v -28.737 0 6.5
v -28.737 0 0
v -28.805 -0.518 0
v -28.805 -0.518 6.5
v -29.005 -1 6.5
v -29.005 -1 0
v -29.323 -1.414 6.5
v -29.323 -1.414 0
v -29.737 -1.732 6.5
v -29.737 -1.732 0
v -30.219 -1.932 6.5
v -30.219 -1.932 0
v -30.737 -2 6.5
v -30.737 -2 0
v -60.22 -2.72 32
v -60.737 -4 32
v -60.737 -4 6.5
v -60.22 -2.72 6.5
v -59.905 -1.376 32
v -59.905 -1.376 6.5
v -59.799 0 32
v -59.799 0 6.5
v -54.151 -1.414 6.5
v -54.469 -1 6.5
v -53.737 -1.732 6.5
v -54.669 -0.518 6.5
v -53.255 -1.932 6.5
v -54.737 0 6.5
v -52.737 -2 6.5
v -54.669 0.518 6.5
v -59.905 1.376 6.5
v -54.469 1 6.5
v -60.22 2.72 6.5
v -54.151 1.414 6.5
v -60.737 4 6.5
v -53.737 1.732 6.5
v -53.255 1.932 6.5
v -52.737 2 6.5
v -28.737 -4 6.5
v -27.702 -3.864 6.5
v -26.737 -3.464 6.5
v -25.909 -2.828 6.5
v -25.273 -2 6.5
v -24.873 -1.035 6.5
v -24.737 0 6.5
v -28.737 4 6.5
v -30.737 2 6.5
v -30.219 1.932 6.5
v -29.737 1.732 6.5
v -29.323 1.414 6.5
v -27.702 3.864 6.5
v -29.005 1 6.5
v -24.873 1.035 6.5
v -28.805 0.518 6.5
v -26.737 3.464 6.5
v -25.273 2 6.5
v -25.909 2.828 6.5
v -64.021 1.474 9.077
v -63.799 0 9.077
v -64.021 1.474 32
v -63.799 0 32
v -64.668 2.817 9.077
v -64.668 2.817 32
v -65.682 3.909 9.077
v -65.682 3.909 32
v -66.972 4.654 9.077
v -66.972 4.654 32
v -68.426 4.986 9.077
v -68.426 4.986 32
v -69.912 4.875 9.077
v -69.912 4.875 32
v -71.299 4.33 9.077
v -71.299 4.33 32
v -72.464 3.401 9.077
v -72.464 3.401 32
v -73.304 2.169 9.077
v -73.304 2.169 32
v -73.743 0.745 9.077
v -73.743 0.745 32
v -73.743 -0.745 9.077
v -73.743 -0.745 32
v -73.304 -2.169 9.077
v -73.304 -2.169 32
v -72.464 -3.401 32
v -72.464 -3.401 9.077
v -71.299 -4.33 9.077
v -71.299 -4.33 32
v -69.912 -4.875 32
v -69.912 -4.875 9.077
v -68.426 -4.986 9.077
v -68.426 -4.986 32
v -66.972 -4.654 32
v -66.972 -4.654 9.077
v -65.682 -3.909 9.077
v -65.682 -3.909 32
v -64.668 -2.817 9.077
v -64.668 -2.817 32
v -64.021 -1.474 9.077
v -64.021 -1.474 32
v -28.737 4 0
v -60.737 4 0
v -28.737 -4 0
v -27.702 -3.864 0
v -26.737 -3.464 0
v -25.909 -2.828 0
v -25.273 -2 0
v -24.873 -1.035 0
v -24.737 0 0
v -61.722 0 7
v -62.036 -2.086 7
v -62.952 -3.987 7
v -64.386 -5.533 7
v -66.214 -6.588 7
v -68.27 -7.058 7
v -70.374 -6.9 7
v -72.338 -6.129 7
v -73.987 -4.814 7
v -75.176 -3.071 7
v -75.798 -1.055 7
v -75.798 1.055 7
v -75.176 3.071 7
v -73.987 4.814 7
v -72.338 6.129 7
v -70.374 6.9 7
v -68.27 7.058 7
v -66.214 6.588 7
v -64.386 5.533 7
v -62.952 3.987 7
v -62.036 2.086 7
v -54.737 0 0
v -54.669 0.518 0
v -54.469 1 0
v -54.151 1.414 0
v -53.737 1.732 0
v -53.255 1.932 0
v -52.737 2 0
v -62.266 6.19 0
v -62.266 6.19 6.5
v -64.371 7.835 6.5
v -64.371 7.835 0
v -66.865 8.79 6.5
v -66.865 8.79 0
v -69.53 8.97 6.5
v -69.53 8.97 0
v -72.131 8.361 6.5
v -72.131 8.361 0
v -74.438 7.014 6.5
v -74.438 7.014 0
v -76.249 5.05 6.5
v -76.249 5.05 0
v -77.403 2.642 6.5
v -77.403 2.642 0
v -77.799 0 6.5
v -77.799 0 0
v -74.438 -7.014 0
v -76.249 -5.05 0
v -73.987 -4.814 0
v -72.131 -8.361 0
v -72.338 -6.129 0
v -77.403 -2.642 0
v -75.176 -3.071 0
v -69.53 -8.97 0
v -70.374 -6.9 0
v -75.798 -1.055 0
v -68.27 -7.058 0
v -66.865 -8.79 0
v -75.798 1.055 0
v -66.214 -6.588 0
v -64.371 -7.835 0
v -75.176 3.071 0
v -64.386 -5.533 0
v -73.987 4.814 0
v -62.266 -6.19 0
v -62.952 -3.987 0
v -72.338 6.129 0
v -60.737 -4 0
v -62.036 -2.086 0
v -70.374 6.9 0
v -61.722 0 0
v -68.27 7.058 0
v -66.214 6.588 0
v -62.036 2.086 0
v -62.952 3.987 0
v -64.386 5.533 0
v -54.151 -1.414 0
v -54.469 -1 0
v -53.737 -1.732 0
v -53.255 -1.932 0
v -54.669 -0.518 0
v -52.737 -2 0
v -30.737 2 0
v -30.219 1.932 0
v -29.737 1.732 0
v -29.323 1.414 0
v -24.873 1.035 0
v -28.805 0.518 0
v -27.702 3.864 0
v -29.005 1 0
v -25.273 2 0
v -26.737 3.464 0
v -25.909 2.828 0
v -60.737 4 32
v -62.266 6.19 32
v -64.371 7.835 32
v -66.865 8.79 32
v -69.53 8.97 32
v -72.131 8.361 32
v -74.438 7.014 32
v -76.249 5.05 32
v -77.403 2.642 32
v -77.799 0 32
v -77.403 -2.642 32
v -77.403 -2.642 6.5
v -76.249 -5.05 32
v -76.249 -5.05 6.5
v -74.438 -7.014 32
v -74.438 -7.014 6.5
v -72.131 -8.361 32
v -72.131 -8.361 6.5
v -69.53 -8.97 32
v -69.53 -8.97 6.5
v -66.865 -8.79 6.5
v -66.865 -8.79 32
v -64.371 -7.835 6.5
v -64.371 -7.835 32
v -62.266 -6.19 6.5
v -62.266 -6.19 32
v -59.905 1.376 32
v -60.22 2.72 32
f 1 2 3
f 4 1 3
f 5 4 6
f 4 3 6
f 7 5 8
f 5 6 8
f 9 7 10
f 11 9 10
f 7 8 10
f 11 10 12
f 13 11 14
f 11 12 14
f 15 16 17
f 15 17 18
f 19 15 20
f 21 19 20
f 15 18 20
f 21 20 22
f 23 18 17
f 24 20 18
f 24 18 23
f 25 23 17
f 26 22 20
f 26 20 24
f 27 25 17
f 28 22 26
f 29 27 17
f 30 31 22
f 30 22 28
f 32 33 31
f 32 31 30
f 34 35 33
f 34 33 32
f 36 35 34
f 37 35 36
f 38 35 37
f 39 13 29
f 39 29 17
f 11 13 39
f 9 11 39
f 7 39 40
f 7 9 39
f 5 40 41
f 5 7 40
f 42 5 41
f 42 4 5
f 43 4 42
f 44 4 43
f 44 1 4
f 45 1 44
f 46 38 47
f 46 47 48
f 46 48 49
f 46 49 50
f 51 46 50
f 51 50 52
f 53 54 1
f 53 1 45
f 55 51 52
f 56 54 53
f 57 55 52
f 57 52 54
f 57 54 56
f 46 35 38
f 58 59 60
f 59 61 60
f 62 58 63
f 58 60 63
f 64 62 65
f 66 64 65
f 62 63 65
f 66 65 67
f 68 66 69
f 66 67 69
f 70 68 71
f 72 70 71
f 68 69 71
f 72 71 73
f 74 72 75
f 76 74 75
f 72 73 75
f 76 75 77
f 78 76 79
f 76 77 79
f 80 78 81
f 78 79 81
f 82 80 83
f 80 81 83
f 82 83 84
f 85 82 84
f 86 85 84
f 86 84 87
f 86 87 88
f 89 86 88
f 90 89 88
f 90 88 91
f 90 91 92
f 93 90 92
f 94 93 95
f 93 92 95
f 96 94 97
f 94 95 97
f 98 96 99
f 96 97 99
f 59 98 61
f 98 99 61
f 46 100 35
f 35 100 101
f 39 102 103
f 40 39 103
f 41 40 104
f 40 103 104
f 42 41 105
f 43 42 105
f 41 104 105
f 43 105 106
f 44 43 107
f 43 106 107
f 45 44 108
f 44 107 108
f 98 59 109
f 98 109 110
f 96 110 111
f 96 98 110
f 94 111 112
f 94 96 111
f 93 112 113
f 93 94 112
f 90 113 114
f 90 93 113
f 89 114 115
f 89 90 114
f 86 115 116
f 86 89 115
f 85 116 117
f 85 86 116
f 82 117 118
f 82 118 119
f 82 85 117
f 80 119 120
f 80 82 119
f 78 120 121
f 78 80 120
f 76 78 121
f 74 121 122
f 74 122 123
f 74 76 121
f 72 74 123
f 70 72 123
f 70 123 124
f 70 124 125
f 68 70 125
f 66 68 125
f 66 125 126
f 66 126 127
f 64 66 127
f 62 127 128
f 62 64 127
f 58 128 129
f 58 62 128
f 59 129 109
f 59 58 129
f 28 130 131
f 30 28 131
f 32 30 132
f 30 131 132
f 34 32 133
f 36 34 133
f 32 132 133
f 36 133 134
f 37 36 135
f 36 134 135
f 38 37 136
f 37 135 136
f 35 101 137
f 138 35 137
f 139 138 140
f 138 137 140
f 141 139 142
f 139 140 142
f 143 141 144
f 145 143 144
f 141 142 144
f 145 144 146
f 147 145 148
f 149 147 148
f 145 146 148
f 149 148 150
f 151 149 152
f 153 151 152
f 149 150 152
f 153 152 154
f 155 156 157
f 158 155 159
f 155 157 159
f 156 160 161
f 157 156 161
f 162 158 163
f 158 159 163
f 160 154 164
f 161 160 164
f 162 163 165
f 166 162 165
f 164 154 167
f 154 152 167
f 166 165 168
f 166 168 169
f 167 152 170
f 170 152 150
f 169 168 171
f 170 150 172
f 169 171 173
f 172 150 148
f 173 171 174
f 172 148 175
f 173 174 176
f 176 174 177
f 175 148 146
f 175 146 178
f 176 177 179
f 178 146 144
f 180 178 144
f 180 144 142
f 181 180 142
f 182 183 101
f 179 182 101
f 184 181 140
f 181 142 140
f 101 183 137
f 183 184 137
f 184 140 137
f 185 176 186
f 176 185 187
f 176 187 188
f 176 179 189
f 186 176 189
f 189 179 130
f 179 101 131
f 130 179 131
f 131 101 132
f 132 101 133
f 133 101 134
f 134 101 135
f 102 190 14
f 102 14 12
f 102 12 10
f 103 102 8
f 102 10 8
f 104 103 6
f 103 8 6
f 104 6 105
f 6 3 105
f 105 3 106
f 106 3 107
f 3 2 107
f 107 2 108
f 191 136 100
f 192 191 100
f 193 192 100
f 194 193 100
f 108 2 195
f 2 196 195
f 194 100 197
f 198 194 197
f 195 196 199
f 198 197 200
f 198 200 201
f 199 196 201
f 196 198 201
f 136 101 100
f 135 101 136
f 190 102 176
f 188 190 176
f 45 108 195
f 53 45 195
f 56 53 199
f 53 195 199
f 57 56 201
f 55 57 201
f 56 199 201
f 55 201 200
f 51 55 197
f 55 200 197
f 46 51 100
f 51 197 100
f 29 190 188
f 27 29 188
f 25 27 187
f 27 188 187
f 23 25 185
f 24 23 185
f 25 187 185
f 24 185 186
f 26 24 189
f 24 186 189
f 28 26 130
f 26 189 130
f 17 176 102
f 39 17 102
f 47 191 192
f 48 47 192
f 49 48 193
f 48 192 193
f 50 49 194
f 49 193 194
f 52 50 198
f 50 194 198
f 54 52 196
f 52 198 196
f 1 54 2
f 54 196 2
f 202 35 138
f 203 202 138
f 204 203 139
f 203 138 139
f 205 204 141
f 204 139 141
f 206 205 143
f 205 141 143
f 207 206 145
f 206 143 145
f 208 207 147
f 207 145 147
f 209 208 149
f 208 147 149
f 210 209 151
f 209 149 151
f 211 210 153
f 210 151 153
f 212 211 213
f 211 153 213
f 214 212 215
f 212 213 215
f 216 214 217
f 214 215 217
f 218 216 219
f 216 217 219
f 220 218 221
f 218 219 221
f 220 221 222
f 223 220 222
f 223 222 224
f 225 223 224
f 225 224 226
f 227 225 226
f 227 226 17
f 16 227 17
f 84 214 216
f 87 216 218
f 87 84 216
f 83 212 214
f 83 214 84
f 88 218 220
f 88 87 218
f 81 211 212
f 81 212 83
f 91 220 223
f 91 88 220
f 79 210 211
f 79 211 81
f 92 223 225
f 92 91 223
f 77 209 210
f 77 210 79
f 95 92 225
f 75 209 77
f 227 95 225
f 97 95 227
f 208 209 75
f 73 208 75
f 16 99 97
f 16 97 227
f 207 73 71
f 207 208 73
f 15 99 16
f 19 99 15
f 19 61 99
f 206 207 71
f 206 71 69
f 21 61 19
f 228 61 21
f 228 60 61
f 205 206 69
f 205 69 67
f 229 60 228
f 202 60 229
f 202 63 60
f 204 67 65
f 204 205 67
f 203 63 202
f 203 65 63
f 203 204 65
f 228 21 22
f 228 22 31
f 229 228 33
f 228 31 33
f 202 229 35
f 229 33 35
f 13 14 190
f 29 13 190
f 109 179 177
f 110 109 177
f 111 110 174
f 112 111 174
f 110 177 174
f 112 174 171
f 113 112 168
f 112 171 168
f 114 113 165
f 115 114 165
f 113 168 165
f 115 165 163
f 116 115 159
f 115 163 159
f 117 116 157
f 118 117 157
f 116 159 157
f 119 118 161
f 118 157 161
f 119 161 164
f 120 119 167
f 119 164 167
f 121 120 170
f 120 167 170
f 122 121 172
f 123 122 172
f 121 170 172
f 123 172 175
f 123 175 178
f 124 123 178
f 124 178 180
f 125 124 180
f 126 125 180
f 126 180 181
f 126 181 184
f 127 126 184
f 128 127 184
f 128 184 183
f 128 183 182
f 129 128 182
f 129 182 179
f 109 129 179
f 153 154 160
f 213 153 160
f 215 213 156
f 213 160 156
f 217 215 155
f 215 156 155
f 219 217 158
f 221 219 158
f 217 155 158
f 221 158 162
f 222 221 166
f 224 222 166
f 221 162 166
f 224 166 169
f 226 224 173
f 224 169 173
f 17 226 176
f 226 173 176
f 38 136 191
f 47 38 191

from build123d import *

# Parameters (mm, degrees)
F1_DEPTH    = 6.5
F3_DEPTH    = 25.5
F4_R        = 5
F5_DEPTH    = 32
F6_R        = 7.0774645673
F6_R_2      = 5
F7_DEPTH    = 12
F8_S5_R     = 5
F8_T6_DEPTH = 12


# Not quite as in the source:
# - a fillet or chamfer that OpenCascade refuses, or shapes differently, is made with other operations: its cross-section is extruded or revolved along the edge and cut away or added


with BuildPart() as f1:
    # F0 (on Top) → F1 (new body)
    with BuildSketch(Plane.XY):
        with BuildLine():
            Line((-28.7369439649, 4), (-60.7369439649, 4))
            ThreePointArc((-60.7369439649, 4), (-70.8534266602, 8.7624288794), (-77.7992017132, 0))
            ThreePointArc((-77.7992017132, 0), (-70.8534266602, -8.7624288794), (-60.7369439649, -4))
            Line((-60.7369439649, -4), (-28.7369439649, -4))
            ThreePointArc((-28.7369439649, -4), (-25.9085168402, -2.8284271247), (-24.7369439649, 0))
            ThreePointArc((-24.7369439649, 0), (-25.9085168402, 2.8284271247), (-28.7369439649, 4))
        make_face()
        with BuildLine():
            ThreePointArc((-54.7369439649, 0), (-54.1511575273, 1.4142135624), (-52.7369439649, 2))
            Line((-52.7369439649, 2), (-30.7369439649, 2))
            ThreePointArc((-30.7369439649, 2), (-29.3227304026, 1.4142135624), (-28.7369439649, 0))
            ThreePointArc((-28.7369439649, 0), (-29.3227304026, -1.4142135624), (-30.7369439649, -2))
            Line((-30.7369439649, -2), (-52.7369439649, -2))
            ThreePointArc((-52.7369439649, -2), (-54.1511575273, -1.4142135624), (-54.7369439649, 0))
        make_face(mode=Mode.SUBTRACT)
    extrude(amount=F1_DEPTH)

    # F2 (on face) → F3 (join)
    with BuildSketch(Plane.XY.offset(6.5)):
        with BuildLine():
            ThreePointArc((-60.7369439649, -4), (-60.0367728338, -2.0542249469), (-59.7992017132, 0))
            ThreePointArc((-59.7992017132, 0), (-60.0367728338, 2.0542249469), (-60.7369439649, 4))
            ThreePointArc((-60.7369439649, 4), (-77.7992017132, 0), (-60.7369439649, -4))
        make_face()
    extrude(amount=F3_DEPTH)

    # F4 (on face) → F5 (cut, through all)
    with BuildSketch(Plane.XY.offset(32)):
        with Locations((-68.7992017132, 0)):
            Circle(F4_R)
    extrude(amount=-F5_DEPTH, mode=Mode.SUBTRACT)

    # F6 (on face) → F7 (cut)
    with BuildSketch(Plane(origin=(0, 0, 0), x_dir=(1, 0, 0), z_dir=(0, 0, -1))):
        with Locations((-68.7992017132, 0)):
            Circle(F6_R)
        with Locations((-68.7992017132, 0)):
            Circle(F6_R_2, mode=Mode.SUBTRACT)
    extrude(amount=-F7_DEPTH, mode=Mode.SUBTRACT)

    # F8: chamfer of 5 on 1 edges, made by hand


with BuildPart() as f8_tool2:
    # F8_s3 → F8_t4 (revolve)
    with BuildSketch(Plane.XZ):
        Polygon((-61.721737146, 7), (-66.721737146, 12), (-61.721737146, 12), align=None)
    revolve(axis=Axis((-68.7992017132, 0, 12), (0, 0, -1)))

    # F8_s5 → F8_t6 (cut, symmetric)
    with BuildSketch(Plane.XY.offset(9.5)):
        with Locations((-68.7992017132, 0)):
            Circle(F8_S5_R)
    extrude(amount=F8_T6_DEPTH, both=True, mode=Mode.SUBTRACT)


with BuildPart() as f1_1:
    add(f1.part)

    # F8_t1: union F8_tool2
    add(f8_tool2.part)


solid = f1_1.part
